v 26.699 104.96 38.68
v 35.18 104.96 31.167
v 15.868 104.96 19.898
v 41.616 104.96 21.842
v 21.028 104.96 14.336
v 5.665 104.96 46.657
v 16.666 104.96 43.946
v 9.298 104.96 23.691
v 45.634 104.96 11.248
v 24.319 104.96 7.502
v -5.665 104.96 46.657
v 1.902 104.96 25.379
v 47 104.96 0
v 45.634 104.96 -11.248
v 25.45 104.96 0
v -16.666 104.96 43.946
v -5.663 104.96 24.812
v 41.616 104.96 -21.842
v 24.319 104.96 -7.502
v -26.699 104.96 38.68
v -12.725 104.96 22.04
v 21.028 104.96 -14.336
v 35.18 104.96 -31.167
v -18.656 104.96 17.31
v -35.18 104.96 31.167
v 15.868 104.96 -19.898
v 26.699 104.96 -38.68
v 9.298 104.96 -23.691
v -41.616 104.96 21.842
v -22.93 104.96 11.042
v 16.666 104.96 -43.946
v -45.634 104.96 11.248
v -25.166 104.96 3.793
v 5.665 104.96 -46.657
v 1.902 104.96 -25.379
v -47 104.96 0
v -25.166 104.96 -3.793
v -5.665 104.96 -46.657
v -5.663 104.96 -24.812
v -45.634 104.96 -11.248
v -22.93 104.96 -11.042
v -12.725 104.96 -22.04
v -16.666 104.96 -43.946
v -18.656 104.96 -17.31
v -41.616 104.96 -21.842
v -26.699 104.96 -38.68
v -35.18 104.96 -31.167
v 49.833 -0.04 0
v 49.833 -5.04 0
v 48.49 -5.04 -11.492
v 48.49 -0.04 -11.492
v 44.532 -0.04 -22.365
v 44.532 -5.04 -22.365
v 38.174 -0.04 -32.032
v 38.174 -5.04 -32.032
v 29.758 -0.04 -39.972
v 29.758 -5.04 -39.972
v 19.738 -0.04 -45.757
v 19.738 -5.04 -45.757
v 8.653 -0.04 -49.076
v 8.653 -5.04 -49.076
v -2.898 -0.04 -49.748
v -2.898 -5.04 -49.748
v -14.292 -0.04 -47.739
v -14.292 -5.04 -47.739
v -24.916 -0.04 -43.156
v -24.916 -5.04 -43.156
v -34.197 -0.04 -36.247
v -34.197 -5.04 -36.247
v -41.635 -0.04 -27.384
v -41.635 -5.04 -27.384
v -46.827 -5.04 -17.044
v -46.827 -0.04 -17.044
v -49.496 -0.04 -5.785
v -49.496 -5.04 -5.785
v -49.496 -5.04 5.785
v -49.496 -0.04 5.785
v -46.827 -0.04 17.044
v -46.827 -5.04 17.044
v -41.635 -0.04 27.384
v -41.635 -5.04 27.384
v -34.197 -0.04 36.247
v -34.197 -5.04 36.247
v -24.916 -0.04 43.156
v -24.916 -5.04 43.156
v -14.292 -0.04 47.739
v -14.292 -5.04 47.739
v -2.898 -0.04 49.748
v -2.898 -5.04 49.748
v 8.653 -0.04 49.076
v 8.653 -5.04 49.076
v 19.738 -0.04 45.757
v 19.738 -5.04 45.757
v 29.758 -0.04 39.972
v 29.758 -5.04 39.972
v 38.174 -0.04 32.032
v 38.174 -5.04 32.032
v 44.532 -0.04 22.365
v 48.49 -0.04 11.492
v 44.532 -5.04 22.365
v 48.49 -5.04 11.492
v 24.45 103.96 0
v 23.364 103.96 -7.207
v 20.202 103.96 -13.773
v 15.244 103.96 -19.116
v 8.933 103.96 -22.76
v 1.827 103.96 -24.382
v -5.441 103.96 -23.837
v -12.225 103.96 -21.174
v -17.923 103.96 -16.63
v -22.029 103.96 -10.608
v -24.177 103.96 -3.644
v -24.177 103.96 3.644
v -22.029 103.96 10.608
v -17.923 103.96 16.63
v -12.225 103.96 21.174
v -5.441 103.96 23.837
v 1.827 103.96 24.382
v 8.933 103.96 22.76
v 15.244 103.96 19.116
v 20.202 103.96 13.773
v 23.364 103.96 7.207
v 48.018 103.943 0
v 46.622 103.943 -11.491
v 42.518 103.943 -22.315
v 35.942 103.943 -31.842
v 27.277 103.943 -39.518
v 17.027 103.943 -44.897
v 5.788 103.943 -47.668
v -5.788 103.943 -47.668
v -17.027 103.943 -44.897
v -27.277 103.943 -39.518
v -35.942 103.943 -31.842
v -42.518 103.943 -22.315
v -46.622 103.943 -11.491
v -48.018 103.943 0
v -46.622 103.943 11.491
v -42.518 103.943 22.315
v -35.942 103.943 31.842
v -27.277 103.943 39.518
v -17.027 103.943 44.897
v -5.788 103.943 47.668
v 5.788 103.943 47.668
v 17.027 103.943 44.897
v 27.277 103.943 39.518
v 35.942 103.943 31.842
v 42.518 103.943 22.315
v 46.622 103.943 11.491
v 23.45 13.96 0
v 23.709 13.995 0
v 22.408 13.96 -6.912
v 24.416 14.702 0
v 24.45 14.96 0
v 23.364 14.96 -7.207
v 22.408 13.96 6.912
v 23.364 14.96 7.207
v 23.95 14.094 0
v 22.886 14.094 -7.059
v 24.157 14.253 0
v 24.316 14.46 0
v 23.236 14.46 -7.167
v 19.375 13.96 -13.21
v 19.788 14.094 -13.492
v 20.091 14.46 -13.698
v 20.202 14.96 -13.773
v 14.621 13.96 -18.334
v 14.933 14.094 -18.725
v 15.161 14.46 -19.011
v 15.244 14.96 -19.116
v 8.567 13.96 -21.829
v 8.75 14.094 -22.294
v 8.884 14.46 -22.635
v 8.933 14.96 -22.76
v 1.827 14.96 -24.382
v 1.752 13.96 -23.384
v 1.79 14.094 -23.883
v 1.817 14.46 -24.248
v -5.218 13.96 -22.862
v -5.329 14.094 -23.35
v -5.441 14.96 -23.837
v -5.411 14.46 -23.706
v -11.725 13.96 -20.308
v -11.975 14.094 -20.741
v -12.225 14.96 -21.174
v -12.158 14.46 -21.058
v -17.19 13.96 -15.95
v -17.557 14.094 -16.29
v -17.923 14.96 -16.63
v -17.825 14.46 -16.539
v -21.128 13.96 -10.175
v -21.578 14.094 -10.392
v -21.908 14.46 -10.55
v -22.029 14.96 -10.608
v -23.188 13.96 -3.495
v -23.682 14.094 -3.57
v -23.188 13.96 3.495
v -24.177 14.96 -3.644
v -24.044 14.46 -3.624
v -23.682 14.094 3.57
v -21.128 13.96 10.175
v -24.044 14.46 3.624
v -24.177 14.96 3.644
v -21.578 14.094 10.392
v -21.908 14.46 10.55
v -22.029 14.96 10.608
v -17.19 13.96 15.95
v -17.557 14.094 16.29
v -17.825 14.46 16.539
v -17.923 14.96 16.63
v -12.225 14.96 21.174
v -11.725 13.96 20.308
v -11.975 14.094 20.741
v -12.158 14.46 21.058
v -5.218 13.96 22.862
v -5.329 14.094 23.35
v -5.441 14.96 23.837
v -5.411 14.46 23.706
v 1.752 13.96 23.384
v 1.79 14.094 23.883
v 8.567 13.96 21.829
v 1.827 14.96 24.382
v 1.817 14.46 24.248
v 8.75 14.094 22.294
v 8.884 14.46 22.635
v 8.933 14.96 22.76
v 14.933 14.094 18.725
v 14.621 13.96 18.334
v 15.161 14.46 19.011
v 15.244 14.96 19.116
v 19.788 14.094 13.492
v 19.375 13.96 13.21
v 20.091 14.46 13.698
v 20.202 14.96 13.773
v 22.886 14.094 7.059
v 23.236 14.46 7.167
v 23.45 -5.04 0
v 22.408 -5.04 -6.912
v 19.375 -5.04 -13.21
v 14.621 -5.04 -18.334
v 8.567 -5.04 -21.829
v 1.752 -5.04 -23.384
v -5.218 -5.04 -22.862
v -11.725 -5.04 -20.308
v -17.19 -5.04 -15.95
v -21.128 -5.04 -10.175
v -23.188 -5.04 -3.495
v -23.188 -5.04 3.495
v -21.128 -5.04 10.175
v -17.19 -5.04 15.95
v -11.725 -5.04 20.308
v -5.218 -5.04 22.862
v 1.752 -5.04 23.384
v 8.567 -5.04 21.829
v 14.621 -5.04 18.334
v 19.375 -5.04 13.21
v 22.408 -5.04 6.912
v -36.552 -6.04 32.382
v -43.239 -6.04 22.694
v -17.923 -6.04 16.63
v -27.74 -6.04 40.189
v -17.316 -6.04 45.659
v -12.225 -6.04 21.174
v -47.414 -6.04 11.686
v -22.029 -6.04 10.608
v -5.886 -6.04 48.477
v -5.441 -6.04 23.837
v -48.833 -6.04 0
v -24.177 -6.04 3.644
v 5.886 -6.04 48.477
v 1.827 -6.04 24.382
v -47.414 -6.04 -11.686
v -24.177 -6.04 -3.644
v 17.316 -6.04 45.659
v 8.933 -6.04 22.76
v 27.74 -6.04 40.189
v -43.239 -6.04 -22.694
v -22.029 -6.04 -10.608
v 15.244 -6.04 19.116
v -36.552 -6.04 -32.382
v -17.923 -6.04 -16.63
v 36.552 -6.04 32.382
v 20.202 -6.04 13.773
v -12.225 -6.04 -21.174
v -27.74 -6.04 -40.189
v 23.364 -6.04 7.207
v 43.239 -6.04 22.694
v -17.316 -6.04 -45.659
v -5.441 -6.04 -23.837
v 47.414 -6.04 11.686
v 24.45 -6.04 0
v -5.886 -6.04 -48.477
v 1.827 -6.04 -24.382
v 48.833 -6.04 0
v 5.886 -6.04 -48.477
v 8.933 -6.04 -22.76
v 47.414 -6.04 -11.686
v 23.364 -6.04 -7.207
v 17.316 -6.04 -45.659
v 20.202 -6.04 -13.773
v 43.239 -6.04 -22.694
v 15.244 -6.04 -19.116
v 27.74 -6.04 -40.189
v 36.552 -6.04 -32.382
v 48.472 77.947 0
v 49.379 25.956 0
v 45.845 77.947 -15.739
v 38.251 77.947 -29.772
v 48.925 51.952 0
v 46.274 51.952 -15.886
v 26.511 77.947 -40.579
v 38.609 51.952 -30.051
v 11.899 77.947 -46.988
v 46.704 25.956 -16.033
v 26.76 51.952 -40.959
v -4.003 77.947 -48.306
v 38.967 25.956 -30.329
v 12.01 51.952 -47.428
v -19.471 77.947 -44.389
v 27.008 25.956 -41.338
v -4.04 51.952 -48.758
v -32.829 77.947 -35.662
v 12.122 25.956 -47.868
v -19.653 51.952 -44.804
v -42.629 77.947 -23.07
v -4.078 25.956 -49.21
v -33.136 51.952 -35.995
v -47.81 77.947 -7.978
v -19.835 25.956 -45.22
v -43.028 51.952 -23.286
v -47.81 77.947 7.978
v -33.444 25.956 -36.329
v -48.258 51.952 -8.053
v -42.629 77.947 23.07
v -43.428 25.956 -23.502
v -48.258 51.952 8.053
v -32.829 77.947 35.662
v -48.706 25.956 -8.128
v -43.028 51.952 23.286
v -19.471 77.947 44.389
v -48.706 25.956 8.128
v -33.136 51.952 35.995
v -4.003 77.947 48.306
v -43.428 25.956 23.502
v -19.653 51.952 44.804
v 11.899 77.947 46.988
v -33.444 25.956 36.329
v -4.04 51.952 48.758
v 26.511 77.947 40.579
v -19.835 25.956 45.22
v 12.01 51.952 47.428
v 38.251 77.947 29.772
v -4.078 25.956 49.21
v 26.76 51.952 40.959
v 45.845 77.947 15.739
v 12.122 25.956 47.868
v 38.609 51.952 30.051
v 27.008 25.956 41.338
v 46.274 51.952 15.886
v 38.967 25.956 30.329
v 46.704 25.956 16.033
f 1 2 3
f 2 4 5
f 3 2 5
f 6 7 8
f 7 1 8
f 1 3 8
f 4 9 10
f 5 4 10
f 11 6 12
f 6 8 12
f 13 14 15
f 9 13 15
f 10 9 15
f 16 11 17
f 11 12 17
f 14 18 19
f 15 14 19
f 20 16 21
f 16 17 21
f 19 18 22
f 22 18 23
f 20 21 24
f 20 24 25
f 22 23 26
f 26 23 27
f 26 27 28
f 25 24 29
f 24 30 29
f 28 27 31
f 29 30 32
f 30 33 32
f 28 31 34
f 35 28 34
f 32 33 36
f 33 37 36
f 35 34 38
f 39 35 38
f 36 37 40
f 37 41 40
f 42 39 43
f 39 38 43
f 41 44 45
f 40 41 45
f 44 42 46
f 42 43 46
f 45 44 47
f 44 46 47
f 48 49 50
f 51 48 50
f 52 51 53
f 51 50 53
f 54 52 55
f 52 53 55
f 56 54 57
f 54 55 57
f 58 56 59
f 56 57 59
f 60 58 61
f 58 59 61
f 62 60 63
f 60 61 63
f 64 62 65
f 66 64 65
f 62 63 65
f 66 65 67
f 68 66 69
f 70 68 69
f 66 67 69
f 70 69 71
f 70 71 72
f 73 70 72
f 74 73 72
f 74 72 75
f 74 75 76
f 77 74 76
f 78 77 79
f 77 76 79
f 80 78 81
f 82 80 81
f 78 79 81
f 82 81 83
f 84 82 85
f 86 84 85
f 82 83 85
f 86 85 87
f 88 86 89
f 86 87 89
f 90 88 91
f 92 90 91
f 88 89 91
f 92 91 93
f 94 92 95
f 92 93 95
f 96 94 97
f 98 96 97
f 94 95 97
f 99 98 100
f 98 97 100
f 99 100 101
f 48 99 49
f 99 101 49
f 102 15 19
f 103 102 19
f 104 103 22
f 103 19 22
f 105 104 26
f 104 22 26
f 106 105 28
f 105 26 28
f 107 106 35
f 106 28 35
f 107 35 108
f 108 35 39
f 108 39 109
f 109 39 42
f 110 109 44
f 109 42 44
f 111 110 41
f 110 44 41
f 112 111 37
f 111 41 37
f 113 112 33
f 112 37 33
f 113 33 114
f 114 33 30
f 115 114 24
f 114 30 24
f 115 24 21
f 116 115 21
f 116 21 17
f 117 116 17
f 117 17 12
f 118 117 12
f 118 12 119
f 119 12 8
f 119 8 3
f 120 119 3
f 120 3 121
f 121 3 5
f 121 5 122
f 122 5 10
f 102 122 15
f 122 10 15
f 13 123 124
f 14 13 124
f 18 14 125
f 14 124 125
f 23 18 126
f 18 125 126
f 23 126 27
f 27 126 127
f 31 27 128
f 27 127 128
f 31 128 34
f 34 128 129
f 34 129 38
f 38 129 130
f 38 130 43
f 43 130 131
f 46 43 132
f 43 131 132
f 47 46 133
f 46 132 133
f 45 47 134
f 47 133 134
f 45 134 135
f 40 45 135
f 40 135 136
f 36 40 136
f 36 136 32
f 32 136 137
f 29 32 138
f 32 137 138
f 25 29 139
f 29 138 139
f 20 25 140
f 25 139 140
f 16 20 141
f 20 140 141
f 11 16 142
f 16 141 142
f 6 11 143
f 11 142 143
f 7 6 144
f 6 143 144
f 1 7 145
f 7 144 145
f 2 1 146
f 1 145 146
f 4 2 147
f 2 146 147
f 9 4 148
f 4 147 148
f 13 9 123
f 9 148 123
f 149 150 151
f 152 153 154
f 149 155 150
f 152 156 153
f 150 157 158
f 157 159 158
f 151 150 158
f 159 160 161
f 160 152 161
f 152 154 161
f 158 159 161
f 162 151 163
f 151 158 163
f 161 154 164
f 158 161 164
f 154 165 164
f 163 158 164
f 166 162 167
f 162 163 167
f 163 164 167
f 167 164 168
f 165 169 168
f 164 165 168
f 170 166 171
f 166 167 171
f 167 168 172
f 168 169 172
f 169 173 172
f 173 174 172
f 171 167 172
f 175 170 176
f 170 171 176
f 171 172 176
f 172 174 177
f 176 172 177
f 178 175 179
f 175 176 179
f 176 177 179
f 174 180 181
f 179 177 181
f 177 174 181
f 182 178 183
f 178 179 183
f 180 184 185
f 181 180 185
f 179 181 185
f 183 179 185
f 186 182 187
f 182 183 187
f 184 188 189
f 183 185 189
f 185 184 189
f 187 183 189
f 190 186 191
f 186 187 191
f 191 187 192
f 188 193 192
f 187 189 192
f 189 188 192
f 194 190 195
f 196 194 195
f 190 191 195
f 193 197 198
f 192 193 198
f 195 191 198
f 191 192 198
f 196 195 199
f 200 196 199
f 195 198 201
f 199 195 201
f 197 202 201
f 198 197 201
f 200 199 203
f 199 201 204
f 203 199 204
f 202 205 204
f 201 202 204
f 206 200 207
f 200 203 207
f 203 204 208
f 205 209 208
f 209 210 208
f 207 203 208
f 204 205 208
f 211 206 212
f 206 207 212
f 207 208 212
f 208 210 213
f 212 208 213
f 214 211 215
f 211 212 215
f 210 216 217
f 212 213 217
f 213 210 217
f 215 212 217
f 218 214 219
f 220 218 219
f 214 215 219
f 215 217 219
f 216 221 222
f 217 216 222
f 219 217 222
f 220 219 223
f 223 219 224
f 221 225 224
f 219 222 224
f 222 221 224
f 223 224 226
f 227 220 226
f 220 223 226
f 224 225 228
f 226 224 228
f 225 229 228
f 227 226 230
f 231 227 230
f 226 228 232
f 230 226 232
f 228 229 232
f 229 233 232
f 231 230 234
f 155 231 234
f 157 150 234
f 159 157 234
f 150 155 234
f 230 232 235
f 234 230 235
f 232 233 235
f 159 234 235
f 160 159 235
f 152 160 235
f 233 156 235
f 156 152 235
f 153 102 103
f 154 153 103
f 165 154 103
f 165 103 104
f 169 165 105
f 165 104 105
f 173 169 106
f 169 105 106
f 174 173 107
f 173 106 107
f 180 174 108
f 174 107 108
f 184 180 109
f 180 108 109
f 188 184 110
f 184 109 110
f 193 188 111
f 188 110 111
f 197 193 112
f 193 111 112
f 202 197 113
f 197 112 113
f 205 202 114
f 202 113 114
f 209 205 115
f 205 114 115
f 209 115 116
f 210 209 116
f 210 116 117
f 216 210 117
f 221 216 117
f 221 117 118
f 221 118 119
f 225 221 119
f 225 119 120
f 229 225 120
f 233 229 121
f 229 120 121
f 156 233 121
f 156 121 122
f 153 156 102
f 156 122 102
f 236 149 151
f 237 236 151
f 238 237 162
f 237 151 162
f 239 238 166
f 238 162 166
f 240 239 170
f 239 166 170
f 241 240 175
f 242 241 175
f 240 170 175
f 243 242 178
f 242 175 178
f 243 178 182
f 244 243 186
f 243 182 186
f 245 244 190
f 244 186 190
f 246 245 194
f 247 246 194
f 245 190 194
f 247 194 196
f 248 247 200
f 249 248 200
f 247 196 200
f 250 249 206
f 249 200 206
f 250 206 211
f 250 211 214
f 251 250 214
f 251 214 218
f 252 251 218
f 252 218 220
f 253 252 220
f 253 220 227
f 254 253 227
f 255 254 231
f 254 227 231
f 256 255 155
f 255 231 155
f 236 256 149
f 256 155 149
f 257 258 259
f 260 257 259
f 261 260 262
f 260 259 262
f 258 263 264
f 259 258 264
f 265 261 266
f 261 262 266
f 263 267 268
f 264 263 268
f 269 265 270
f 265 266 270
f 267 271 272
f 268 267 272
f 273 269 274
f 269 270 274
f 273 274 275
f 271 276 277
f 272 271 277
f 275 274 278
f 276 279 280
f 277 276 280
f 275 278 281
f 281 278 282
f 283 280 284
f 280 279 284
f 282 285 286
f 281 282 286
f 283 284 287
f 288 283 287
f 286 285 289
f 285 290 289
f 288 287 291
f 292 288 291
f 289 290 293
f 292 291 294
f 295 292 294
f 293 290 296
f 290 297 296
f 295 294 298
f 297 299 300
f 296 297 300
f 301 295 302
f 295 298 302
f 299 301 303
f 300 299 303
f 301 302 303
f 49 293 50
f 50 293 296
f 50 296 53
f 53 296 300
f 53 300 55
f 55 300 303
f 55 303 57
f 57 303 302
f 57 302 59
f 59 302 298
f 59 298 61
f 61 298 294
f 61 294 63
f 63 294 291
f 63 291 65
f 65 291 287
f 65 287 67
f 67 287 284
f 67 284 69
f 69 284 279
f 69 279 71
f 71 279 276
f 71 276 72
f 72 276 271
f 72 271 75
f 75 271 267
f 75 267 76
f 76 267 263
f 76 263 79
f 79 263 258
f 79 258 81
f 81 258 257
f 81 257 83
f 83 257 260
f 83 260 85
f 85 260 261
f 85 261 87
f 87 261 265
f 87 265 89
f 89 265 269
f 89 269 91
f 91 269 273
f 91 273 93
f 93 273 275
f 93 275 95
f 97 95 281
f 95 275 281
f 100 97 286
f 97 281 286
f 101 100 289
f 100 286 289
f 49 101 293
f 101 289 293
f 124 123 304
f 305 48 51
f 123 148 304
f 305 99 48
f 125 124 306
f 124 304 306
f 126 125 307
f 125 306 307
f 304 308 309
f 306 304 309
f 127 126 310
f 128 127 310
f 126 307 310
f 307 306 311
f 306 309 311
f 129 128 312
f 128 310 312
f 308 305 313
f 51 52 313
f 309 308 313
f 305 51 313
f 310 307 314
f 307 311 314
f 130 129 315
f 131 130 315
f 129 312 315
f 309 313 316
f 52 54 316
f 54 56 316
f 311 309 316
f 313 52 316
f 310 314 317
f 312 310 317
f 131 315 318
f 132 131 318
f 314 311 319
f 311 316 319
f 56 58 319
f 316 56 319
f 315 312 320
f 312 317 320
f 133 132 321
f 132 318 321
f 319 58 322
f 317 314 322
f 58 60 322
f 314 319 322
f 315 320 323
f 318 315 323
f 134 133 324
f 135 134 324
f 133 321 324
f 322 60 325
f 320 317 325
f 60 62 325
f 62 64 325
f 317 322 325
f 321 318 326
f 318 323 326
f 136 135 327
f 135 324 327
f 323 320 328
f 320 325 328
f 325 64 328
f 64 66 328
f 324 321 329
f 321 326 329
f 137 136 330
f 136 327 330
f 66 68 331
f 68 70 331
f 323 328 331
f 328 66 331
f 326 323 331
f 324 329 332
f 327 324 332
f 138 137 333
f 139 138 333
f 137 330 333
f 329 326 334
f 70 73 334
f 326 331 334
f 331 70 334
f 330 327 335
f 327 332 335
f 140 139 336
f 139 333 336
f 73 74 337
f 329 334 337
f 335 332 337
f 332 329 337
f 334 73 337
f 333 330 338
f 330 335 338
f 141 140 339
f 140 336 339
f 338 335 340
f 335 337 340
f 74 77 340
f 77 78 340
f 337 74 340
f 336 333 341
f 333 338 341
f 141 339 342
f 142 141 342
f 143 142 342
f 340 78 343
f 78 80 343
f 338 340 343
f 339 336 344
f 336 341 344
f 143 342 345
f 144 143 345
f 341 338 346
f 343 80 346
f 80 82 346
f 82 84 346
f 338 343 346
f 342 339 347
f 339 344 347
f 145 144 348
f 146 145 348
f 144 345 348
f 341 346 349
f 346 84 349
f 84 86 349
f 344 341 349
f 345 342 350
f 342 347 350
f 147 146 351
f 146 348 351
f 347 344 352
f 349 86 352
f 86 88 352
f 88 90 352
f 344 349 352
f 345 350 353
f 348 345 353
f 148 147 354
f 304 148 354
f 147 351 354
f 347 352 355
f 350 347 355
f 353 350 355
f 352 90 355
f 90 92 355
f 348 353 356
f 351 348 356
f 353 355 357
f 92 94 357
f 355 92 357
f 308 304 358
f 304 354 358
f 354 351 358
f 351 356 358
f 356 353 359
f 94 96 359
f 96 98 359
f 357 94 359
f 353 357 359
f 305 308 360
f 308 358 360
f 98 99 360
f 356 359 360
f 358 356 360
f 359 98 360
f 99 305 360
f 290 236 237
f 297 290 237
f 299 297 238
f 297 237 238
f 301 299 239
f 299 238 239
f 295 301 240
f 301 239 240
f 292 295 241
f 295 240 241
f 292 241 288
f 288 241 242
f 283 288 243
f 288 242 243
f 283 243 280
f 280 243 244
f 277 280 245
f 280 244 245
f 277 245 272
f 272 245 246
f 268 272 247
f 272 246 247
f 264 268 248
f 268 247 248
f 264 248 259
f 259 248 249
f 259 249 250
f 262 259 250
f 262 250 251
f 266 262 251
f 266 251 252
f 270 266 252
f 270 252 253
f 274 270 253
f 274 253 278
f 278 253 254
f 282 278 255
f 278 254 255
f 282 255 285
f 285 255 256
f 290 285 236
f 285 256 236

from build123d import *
from OCP.BRepFilletAPI import BRepFilletAPI_MakeChamfer

# Parameters (mm, degrees)
SFAZOWANIE1_SIZE  = 1
SFAZOWANIE1_SIZE2 = 1.017920191


with BuildPart() as part:
    # Szkic1 → Obrót1 (revolve)
    with BuildSketch(Plane.XY, mode=Mode.PRIVATE) as obr_t1_sk:
        with BuildLine():
            Line((-24.45, 14.960440746), (-24.45, 104.960440746))
            Line((-24.45, 104.960440746), (-48, 104.960440746))
            Line((-48, 104.960440746), (-49.832781817, -0.039559254))
            Line((-49.832781817, -0.039559254), (-49.832781817, -6.039559254))
            Line((-49.832781817, -6.039559254), (-23.45, -6.039559254))
            Line((-23.45, -6.039559254), (-23.45, 13.960440746))
            ThreePointArc((-23.45, 13.960440746), (-24.157106781, 14.253333965), (-24.45, 14.960440746))
        make_face()
    revolve(obr_t1_sk.sketch.rotate(Axis((0, 0, 0), (0, 1, 0)), 180), axis=Axis((0, 0, 0), (0, 1, 0)))

    # Sfazowanie1: one chamfer whose edges measure the first distance from different faces: ONE call of the kernel's chamfer builder (chamfer() names one face for all edges)
    sfazowanie1_edges_1 = [part.edges().sort_by_distance(p)[0] for p in [
        (-24.45, 104.960440746, 0),
        (-23.45, -6.039559254, 0),
        (-49.832781817, -6.039559254, 0),
    ]]
    sfazowanie1_edges_2 = [part.edges().sort_by_distance(p)[0] for p in [
        (-48, 104.960440746, 0),
    ]]
    sfazowanie1_side_2 = [part.faces().sort_by_distance(p)[0] for p in [
        (-25.80764502, 104.960440746, 0),
    ]]
    sfazowanie1 = BRepFilletAPI_MakeChamfer(part.part.solid().wrapped)
    for e in sfazowanie1_edges_1:
        sfazowanie1.Add(SFAZOWANIE1_SIZE, e.wrapped)
    for e in sfazowanie1_edges_2:
        sfazowanie1.Add(SFAZOWANIE1_SIZE, SFAZOWANIE1_SIZE2, e.wrapped, sfazowanie1_side_2[0].wrapped)  # the first distance lies on this face
    add(Compound.cast(sfazowanie1.Shape()), mode=Mode.REPLACE)


solid = part.part
